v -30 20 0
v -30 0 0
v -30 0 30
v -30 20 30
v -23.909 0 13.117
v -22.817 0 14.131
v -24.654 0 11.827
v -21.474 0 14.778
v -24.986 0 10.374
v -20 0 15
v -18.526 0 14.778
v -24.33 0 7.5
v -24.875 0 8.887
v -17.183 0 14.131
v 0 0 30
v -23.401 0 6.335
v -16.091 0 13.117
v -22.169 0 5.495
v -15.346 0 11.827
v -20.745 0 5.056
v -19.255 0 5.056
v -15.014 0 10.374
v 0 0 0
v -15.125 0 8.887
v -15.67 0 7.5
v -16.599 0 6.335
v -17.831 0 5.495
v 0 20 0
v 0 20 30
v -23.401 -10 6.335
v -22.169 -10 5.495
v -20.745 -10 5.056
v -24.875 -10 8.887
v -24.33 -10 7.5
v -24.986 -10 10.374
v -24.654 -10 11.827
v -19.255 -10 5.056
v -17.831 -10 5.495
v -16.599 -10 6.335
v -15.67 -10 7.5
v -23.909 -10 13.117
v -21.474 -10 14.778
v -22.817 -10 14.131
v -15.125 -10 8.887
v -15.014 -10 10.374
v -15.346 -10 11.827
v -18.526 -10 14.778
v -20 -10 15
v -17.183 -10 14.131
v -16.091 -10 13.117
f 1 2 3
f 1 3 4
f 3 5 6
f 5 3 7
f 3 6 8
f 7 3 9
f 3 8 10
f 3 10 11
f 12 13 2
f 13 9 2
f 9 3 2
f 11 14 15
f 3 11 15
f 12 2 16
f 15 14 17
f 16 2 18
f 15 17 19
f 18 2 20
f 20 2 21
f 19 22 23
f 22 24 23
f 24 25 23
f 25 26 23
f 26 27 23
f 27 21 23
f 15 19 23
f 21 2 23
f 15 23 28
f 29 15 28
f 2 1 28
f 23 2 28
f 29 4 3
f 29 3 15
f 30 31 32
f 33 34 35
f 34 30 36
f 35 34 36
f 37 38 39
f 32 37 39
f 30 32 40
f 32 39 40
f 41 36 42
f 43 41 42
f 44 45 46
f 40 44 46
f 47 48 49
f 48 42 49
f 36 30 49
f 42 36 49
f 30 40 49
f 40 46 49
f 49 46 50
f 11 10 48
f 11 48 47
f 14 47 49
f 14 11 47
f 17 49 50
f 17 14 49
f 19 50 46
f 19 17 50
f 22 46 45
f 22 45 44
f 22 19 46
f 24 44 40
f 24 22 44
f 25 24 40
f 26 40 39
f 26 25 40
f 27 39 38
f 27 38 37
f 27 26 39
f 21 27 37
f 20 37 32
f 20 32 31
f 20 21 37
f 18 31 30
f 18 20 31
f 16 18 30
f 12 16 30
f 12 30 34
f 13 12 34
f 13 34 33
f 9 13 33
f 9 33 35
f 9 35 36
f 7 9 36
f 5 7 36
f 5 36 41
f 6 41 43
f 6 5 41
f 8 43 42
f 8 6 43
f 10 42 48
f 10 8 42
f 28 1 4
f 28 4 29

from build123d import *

# Parameters (mm, degrees)
ESQUISSE1_W         = 30
ESQUISSE1_H         = 20
BOSS_EXTRU_1_DEPTH  = 30
SKETCH1_R           = 5
BOSS_EXTRUDE1_DEPTH = 10


with BuildPart() as part:
    # Esquisse1 → Boss.-Extru.1 (new body)
    with BuildSketch(Plane.XY):
        with Locations((-15, 10)):
            Rectangle(ESQUISSE1_W, ESQUISSE1_H)
    extrude(amount=BOSS_EXTRU_1_DEPTH)

    # Sketch1 → Boss-Extrude1 (add)
    with BuildSketch(Plane(origin=(0, 0, 0), x_dir=(1, 0, 0), z_dir=(0, 1, 0))):
        with Locations(Location((-20, -10, 0), (0, 0, 270))):
            Circle(SKETCH1_R)
    extrude(amount=-BOSS_EXTRUDE1_DEPTH)


solid = part.part
